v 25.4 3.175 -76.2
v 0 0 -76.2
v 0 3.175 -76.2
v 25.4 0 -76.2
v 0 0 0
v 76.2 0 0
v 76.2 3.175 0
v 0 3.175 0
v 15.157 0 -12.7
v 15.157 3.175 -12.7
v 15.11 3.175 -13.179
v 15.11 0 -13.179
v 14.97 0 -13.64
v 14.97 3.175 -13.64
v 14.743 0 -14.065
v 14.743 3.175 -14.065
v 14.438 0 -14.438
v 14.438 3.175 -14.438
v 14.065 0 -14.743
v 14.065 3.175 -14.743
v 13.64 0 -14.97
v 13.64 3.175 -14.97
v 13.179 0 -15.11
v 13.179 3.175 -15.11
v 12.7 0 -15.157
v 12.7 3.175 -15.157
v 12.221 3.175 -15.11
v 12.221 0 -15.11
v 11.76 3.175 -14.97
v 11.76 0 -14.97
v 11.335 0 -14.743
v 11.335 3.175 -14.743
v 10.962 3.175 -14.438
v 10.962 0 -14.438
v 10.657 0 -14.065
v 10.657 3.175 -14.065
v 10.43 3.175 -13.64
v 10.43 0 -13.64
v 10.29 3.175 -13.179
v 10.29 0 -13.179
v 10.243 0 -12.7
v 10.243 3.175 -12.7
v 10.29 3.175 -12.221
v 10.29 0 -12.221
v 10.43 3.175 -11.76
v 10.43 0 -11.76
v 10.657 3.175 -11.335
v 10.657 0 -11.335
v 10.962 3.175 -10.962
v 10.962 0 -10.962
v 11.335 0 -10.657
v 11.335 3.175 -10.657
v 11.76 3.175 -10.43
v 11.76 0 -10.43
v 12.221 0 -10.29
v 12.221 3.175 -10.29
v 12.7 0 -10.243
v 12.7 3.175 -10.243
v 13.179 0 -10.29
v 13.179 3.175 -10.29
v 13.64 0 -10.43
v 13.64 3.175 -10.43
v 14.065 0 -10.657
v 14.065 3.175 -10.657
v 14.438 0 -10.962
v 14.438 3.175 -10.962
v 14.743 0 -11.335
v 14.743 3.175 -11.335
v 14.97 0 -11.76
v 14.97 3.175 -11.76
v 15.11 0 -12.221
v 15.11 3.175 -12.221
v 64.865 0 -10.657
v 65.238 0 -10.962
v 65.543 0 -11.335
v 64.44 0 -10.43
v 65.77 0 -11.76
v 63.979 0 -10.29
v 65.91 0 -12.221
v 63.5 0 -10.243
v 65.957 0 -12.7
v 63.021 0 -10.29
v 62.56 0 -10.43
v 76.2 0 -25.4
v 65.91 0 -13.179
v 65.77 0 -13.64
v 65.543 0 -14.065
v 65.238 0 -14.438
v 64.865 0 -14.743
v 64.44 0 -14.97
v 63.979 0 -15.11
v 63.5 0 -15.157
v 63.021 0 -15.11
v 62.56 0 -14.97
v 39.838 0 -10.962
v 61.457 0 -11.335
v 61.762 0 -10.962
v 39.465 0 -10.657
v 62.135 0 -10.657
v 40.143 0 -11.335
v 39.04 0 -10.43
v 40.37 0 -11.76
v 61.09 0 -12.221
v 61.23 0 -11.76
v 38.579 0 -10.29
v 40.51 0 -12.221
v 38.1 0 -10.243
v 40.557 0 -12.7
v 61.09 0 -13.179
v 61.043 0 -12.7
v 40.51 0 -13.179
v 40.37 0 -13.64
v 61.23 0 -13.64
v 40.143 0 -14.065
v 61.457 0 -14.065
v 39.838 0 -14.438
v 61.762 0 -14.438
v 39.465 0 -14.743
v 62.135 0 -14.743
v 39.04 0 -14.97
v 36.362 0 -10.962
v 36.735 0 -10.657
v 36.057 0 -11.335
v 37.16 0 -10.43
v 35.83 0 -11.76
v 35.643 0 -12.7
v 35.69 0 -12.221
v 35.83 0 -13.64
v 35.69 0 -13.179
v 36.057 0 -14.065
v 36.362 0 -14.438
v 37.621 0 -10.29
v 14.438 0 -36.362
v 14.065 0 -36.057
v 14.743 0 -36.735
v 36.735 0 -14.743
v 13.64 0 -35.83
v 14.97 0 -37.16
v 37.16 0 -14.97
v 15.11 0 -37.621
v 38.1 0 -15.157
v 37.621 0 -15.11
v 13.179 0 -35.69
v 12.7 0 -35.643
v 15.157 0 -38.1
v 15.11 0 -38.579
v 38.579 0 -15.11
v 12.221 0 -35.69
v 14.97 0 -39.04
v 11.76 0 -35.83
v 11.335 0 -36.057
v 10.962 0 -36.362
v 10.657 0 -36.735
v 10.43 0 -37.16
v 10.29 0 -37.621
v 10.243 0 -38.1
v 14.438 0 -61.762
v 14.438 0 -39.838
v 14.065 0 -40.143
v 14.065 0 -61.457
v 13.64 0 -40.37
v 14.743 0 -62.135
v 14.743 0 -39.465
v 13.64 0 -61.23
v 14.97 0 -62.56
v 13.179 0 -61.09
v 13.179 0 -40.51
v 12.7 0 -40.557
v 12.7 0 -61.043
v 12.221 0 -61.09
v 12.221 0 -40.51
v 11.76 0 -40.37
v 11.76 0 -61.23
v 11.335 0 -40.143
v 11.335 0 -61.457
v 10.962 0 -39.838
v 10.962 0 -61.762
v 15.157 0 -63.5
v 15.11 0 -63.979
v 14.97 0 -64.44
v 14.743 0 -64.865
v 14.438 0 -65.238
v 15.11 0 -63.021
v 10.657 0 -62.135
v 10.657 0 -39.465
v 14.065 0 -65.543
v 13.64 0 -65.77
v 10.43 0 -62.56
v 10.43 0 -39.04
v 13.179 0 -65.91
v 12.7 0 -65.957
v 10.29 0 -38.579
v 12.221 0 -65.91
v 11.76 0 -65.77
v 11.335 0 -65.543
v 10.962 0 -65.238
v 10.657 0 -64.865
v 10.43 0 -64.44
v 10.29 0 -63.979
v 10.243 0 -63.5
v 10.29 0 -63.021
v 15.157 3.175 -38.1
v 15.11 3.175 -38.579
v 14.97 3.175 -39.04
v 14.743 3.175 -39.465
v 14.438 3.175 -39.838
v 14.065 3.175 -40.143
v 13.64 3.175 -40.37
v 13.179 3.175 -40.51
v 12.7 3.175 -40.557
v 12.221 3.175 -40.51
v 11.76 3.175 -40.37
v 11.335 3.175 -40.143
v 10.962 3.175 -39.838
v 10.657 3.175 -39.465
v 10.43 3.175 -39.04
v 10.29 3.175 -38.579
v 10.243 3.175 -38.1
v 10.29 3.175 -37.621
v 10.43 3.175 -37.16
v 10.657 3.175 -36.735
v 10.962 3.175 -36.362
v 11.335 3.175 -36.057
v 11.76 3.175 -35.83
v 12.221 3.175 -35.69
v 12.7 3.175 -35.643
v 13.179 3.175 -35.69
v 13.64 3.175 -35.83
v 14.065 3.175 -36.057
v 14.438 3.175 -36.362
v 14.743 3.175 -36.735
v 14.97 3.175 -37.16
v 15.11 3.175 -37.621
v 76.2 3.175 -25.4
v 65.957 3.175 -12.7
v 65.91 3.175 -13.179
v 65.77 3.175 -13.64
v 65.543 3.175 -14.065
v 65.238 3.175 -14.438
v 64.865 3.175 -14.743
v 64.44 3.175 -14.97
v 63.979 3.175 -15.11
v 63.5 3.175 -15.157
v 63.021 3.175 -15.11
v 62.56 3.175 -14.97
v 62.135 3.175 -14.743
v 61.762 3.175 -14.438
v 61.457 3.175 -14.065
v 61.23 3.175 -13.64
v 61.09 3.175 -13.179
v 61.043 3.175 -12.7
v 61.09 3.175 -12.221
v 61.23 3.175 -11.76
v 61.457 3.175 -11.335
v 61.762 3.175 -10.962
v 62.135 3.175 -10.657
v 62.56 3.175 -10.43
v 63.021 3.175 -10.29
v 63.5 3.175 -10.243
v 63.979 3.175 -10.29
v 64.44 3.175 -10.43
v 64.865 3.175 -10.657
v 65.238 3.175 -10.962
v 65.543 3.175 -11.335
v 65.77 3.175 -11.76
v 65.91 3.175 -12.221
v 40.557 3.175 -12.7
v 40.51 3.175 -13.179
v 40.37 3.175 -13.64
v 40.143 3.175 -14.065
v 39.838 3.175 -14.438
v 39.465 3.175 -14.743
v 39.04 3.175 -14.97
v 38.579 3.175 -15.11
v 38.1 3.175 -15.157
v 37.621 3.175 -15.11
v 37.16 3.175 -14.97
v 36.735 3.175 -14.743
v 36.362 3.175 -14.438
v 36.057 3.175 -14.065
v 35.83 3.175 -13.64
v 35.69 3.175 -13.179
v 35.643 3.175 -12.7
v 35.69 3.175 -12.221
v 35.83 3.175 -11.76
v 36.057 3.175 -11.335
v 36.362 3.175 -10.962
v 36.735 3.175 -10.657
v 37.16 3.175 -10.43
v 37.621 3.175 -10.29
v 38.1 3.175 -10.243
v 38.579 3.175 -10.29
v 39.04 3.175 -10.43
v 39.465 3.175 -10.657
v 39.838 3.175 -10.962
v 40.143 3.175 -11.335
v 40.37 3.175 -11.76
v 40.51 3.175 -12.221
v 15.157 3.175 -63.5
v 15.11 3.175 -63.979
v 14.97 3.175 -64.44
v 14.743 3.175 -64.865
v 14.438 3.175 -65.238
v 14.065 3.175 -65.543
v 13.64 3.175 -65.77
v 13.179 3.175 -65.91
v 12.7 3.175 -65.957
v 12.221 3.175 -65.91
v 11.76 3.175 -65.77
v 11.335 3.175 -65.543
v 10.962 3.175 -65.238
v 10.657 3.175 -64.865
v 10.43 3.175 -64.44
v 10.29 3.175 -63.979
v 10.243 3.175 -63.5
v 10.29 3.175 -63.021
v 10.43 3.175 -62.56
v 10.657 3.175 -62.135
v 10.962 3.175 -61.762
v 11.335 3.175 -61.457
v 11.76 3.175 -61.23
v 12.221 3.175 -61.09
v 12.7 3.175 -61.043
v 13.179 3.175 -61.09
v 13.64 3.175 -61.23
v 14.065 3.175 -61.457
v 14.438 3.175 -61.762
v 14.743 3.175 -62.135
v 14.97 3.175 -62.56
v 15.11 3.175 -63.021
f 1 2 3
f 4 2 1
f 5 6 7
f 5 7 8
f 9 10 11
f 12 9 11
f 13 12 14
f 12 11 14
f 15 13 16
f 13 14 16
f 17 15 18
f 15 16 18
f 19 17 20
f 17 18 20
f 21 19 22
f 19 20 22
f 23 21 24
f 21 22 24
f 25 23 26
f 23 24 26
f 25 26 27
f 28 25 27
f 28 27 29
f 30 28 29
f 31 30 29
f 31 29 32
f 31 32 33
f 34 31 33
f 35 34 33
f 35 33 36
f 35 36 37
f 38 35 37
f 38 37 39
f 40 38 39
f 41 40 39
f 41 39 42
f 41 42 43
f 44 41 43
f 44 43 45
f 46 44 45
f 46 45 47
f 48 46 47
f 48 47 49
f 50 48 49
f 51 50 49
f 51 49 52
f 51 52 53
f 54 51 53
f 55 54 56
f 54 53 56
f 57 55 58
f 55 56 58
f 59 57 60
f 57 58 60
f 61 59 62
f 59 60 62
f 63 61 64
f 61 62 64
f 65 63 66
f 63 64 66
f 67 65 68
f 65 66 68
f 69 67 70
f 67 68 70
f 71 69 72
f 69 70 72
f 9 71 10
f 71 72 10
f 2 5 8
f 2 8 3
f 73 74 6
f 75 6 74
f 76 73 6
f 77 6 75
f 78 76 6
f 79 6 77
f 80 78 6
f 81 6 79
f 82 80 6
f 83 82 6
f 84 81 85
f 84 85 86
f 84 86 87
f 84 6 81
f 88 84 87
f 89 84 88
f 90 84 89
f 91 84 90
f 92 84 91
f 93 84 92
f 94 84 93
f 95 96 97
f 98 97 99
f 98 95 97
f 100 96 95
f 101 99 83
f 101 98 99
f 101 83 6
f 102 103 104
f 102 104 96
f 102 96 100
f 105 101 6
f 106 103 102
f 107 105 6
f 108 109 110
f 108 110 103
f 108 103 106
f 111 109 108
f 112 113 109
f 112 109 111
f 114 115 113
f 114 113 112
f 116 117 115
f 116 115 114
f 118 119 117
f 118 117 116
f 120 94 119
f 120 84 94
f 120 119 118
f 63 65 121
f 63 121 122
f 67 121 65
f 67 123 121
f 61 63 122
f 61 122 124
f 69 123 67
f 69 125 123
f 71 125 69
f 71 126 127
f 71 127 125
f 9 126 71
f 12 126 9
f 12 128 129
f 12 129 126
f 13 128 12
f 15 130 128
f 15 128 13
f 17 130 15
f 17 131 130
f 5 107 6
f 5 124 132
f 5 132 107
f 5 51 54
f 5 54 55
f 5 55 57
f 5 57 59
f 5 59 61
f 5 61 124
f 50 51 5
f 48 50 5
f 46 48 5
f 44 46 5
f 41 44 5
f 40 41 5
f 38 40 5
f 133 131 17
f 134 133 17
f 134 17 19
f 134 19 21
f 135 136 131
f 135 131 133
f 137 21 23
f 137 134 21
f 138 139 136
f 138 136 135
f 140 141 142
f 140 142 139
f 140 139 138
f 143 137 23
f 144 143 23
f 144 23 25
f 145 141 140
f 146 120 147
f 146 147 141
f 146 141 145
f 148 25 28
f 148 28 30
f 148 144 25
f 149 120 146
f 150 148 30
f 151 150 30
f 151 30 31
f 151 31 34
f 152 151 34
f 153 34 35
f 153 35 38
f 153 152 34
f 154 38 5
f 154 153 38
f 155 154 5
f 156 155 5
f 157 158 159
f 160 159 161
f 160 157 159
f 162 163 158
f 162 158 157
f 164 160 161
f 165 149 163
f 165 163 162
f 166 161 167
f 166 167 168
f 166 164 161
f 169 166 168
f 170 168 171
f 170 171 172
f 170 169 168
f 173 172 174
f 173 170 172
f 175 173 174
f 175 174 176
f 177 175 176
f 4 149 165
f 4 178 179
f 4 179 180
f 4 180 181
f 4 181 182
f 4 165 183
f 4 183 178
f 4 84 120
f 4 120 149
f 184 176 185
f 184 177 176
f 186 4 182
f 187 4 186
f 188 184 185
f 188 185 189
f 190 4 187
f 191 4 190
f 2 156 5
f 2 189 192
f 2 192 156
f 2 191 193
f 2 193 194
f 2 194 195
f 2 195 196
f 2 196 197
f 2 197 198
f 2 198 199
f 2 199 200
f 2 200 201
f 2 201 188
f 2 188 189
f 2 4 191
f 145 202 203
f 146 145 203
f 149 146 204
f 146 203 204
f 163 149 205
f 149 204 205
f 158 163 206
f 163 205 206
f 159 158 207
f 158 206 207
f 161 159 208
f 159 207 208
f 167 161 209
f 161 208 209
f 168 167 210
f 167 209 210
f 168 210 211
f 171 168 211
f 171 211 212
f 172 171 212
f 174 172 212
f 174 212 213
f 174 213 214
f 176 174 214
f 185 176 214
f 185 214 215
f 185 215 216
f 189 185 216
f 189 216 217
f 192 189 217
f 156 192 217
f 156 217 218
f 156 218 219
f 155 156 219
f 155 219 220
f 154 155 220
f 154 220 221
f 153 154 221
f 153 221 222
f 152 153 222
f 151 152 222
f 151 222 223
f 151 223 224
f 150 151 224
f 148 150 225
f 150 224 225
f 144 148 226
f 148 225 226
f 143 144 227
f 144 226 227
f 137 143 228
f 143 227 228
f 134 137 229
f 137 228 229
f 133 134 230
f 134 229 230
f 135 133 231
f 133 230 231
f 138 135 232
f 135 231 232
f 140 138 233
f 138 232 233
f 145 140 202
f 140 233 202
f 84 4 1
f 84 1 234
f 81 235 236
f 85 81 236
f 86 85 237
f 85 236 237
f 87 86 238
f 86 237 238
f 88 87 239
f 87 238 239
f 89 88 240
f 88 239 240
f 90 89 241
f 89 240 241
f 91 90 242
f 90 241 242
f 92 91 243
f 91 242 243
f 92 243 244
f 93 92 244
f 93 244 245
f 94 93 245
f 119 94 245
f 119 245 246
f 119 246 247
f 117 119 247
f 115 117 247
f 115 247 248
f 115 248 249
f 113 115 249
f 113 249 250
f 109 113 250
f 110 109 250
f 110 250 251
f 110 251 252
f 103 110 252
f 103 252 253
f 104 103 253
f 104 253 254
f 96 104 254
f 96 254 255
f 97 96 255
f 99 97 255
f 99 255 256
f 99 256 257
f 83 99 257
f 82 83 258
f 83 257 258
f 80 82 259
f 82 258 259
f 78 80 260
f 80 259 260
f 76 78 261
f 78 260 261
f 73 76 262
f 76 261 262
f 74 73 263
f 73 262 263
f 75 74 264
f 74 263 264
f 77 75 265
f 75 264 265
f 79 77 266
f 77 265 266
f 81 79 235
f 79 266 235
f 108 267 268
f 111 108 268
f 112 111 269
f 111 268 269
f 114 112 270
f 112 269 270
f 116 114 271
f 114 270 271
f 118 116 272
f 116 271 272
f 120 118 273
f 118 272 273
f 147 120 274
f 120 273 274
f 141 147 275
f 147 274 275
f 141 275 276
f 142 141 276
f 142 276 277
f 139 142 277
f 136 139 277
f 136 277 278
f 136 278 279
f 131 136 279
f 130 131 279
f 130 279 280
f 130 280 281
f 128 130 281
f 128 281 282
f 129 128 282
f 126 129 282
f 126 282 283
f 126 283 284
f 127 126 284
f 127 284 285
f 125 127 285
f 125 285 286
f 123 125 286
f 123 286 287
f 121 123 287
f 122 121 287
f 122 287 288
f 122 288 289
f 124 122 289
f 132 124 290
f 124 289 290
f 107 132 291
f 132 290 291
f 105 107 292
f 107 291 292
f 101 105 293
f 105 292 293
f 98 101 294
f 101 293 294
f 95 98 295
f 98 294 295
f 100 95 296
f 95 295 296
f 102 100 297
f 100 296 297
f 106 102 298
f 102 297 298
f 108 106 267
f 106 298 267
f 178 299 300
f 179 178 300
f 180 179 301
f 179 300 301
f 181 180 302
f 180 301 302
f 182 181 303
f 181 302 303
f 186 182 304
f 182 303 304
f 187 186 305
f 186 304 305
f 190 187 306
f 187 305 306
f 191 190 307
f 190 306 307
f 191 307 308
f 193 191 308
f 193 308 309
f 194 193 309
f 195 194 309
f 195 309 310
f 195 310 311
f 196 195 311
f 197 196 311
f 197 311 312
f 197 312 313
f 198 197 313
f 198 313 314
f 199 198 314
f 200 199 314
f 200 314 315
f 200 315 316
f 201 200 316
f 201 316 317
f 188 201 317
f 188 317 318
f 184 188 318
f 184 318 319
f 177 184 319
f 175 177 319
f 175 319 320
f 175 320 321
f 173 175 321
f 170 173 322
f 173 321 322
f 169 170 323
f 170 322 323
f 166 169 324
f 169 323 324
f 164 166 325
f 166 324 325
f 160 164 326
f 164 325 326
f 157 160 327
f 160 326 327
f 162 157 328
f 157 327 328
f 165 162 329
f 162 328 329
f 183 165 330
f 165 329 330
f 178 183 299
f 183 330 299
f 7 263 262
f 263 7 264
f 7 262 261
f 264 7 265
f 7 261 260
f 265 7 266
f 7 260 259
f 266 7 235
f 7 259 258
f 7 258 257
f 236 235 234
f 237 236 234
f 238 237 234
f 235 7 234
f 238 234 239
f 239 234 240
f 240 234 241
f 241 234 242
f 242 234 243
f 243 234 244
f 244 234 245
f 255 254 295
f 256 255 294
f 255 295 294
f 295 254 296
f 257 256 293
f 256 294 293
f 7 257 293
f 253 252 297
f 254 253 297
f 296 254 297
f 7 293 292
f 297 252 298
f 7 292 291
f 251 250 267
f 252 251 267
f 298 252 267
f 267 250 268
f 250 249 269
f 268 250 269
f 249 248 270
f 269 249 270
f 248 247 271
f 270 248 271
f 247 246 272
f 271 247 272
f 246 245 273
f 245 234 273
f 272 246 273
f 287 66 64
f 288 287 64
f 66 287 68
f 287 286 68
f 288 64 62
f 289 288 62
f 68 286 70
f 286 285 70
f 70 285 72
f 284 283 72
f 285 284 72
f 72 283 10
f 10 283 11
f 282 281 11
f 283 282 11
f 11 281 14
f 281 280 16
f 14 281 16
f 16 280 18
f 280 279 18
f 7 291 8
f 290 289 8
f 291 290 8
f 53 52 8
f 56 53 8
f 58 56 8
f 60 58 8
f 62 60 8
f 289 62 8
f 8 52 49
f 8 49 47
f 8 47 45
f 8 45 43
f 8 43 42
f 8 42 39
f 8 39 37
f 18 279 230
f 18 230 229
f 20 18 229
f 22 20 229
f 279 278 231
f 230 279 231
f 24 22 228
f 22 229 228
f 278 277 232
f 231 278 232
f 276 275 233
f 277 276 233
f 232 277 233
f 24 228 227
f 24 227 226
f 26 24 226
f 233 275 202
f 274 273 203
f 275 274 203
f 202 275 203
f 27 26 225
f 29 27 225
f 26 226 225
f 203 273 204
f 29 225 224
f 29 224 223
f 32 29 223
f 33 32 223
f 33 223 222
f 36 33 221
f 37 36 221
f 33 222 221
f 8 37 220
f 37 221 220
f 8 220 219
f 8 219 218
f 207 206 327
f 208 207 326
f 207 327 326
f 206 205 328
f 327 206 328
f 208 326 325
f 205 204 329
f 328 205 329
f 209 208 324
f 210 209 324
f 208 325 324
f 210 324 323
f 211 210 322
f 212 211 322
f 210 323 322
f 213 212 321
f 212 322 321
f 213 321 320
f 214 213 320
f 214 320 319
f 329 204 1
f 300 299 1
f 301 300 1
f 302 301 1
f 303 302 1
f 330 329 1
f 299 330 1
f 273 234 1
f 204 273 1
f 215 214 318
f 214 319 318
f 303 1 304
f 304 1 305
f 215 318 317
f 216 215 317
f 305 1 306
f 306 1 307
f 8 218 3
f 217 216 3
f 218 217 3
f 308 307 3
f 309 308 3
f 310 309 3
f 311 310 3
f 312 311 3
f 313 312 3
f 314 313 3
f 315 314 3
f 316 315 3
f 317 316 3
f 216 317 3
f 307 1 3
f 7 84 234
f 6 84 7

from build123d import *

# Parameters (mm, degrees)
BOSS_EXTRUDE1_DEPTH              = 3.175
F_10_0_1935_DIAMETER_HOLE1_D     = 4.9149
F_10_0_1935_DIAMETER_HOLE1_DEPTH = 25.4
F_10_0_1935_DIAMETER_HOLE1_TIP   = 1.476584928


with BuildPart() as part:
    # Sketch1 → Boss-Extrude1 (new body)
    with BuildSketch(Plane(origin=(0, 0, 0), x_dir=(1, 0, 0), z_dir=(0, 1, 0))):
        Polygon((0, 0), (0, 76.2), (25.4, 76.2), (76.2, 25.4), (76.2, 0), align=None)
    extrude(amount=BOSS_EXTRUDE1_DEPTH)

    # #10 (0.1935) Diameter Hole1
    with Locations(Plane(origin=(0, 0, 0), x_dir=(-1, 0, 0), z_dir=(0, -1, 0))):
        with Locations((-12.7, 12.7), (-12.7, 38.1), (-12.7, 63.5), (-38.1, 12.7), (-63.5, 12.7)):
            Hole(F_10_0_1935_DIAMETER_HOLE1_D / 2, depth=F_10_0_1935_DIAMETER_HOLE1_DEPTH)
            with Locations((0, 0, -(F_10_0_1935_DIAMETER_HOLE1_DEPTH + F_10_0_1935_DIAMETER_HOLE1_TIP / 2))):  # 118° drill point
                Cone(0, F_10_0_1935_DIAMETER_HOLE1_D / 2, F_10_0_1935_DIAMETER_HOLE1_TIP, mode=Mode.SUBTRACT)


solid = part.part
